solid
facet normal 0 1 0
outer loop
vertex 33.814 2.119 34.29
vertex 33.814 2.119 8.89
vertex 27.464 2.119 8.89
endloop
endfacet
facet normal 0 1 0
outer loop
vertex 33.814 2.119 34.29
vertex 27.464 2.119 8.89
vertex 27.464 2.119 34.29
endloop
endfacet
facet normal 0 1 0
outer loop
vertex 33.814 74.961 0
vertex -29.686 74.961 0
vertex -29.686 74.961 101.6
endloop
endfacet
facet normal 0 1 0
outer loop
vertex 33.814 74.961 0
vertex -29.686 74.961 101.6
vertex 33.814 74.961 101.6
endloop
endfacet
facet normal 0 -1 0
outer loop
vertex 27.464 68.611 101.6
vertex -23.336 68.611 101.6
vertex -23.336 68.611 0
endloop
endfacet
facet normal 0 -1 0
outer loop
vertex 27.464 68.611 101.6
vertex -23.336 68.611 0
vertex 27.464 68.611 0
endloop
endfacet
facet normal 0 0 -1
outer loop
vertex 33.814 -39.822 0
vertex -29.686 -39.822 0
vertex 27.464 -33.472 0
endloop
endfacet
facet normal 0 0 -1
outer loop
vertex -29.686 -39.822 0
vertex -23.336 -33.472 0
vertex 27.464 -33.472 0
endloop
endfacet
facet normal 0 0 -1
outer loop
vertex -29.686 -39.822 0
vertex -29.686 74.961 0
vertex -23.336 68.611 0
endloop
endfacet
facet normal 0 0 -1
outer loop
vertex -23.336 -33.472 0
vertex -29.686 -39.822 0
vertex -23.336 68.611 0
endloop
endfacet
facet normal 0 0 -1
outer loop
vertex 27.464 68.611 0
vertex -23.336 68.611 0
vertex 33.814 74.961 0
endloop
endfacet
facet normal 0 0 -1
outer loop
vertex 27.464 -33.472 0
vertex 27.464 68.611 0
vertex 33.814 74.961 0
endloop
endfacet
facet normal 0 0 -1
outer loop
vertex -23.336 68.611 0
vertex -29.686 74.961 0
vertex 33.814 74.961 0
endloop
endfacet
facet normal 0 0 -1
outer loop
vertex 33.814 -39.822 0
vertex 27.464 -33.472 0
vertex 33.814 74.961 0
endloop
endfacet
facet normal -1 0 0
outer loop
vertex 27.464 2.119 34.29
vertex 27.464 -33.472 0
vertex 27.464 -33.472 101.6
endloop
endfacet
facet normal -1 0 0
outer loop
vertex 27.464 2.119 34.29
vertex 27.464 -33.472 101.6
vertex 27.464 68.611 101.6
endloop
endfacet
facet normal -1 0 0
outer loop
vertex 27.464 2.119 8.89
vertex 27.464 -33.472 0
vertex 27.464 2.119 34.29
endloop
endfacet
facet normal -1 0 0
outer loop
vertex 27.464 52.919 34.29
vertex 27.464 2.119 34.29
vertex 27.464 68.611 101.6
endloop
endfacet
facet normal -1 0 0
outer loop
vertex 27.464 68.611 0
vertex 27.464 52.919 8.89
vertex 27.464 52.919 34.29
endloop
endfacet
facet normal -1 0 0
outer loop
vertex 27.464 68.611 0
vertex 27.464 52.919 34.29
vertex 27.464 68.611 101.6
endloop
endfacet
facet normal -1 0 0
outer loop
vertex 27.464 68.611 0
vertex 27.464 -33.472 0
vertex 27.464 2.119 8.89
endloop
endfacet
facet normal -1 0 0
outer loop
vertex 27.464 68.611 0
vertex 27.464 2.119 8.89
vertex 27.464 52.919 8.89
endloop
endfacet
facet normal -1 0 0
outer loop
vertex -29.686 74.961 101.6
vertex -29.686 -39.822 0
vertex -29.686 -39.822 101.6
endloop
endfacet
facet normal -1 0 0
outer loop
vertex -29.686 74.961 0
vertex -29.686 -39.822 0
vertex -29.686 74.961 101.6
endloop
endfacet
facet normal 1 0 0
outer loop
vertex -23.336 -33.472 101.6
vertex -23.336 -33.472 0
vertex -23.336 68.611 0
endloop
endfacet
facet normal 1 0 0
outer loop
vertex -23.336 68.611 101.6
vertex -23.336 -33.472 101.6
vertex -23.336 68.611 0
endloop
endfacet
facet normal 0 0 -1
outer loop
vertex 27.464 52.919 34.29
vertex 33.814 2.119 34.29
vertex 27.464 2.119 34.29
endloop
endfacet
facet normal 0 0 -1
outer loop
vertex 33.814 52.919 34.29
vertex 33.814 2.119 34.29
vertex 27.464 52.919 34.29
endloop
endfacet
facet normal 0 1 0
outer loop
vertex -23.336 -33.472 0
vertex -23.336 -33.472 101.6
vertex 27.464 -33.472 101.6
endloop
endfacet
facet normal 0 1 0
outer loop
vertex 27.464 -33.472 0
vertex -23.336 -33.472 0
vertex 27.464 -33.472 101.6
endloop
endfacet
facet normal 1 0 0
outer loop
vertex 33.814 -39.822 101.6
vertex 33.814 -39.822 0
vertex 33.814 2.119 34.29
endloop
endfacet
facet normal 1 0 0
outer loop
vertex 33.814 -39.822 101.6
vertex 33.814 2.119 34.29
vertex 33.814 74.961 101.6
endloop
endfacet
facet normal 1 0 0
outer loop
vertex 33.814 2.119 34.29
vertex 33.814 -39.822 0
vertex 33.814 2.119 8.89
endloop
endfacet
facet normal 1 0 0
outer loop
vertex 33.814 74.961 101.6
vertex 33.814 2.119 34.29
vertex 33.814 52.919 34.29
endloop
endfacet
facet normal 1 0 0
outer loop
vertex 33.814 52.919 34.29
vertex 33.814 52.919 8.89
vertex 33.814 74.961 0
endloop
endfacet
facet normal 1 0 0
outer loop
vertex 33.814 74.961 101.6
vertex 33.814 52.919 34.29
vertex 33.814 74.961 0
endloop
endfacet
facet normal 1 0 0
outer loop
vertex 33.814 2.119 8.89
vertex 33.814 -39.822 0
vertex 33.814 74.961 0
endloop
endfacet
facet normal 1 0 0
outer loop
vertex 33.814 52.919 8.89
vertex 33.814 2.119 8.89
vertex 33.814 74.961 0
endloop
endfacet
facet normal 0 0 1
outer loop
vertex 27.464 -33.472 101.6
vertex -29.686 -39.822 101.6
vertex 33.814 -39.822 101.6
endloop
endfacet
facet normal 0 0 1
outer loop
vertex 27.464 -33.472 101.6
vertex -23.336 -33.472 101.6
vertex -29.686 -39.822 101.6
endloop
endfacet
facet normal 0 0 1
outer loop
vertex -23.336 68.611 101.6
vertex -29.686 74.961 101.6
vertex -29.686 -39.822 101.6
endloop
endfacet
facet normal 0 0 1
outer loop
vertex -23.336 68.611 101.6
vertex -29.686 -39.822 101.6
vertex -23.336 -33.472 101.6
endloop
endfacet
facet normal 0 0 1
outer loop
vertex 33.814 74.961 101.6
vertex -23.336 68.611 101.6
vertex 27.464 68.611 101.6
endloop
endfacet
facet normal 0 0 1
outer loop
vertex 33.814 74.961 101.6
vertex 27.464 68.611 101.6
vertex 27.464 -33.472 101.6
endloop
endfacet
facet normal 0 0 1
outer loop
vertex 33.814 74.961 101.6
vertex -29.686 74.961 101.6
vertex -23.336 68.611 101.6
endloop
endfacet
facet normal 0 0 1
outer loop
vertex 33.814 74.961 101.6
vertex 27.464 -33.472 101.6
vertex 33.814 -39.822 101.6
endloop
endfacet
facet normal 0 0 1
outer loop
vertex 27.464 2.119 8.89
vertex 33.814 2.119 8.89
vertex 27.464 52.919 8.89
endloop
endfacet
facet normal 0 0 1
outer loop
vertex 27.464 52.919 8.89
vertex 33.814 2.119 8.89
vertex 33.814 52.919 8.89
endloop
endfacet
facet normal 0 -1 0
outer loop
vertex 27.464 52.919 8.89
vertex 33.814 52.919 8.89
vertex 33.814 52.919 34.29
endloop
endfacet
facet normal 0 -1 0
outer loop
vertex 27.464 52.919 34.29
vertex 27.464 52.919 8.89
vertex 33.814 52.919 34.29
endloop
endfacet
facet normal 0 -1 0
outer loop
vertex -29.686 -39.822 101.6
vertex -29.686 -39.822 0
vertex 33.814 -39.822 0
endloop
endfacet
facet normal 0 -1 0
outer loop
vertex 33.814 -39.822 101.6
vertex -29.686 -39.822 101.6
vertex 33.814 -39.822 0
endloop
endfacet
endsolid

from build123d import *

# Parameters (mm, degrees)
F0_W     = 63.5
F0_H     = 114.7826
F0_W_2   = 50.8
F0_H_2   = 102.0826
F1_DEPTH = 101.6
F2_W     = 50.8
F2_H     = 25.4
F3_DEPTH = 25.4


with BuildPart() as f1:
    # F0 (on Top) → F1 (new body)
    with BuildSketch(Plane.XY):
        with Locations((2.064243, 17.569714)):
            Rectangle(F0_W, F0_H)
        with Locations((2.064243, 17.569714)):
            Rectangle(F0_W_2, F0_H_2, mode=Mode.SUBTRACT)
    extrude(amount=F1_DEPTH)

    # F2 (on face) → F3 (cut)
    with BuildSketch(Plane.YZ.offset(33.814243)):
        with Locations((27.519288, 21.59)):
            Rectangle(F2_W, F2_H)
    extrude(amount=-F3_DEPTH, mode=Mode.SUBTRACT)


solid = f1.part
